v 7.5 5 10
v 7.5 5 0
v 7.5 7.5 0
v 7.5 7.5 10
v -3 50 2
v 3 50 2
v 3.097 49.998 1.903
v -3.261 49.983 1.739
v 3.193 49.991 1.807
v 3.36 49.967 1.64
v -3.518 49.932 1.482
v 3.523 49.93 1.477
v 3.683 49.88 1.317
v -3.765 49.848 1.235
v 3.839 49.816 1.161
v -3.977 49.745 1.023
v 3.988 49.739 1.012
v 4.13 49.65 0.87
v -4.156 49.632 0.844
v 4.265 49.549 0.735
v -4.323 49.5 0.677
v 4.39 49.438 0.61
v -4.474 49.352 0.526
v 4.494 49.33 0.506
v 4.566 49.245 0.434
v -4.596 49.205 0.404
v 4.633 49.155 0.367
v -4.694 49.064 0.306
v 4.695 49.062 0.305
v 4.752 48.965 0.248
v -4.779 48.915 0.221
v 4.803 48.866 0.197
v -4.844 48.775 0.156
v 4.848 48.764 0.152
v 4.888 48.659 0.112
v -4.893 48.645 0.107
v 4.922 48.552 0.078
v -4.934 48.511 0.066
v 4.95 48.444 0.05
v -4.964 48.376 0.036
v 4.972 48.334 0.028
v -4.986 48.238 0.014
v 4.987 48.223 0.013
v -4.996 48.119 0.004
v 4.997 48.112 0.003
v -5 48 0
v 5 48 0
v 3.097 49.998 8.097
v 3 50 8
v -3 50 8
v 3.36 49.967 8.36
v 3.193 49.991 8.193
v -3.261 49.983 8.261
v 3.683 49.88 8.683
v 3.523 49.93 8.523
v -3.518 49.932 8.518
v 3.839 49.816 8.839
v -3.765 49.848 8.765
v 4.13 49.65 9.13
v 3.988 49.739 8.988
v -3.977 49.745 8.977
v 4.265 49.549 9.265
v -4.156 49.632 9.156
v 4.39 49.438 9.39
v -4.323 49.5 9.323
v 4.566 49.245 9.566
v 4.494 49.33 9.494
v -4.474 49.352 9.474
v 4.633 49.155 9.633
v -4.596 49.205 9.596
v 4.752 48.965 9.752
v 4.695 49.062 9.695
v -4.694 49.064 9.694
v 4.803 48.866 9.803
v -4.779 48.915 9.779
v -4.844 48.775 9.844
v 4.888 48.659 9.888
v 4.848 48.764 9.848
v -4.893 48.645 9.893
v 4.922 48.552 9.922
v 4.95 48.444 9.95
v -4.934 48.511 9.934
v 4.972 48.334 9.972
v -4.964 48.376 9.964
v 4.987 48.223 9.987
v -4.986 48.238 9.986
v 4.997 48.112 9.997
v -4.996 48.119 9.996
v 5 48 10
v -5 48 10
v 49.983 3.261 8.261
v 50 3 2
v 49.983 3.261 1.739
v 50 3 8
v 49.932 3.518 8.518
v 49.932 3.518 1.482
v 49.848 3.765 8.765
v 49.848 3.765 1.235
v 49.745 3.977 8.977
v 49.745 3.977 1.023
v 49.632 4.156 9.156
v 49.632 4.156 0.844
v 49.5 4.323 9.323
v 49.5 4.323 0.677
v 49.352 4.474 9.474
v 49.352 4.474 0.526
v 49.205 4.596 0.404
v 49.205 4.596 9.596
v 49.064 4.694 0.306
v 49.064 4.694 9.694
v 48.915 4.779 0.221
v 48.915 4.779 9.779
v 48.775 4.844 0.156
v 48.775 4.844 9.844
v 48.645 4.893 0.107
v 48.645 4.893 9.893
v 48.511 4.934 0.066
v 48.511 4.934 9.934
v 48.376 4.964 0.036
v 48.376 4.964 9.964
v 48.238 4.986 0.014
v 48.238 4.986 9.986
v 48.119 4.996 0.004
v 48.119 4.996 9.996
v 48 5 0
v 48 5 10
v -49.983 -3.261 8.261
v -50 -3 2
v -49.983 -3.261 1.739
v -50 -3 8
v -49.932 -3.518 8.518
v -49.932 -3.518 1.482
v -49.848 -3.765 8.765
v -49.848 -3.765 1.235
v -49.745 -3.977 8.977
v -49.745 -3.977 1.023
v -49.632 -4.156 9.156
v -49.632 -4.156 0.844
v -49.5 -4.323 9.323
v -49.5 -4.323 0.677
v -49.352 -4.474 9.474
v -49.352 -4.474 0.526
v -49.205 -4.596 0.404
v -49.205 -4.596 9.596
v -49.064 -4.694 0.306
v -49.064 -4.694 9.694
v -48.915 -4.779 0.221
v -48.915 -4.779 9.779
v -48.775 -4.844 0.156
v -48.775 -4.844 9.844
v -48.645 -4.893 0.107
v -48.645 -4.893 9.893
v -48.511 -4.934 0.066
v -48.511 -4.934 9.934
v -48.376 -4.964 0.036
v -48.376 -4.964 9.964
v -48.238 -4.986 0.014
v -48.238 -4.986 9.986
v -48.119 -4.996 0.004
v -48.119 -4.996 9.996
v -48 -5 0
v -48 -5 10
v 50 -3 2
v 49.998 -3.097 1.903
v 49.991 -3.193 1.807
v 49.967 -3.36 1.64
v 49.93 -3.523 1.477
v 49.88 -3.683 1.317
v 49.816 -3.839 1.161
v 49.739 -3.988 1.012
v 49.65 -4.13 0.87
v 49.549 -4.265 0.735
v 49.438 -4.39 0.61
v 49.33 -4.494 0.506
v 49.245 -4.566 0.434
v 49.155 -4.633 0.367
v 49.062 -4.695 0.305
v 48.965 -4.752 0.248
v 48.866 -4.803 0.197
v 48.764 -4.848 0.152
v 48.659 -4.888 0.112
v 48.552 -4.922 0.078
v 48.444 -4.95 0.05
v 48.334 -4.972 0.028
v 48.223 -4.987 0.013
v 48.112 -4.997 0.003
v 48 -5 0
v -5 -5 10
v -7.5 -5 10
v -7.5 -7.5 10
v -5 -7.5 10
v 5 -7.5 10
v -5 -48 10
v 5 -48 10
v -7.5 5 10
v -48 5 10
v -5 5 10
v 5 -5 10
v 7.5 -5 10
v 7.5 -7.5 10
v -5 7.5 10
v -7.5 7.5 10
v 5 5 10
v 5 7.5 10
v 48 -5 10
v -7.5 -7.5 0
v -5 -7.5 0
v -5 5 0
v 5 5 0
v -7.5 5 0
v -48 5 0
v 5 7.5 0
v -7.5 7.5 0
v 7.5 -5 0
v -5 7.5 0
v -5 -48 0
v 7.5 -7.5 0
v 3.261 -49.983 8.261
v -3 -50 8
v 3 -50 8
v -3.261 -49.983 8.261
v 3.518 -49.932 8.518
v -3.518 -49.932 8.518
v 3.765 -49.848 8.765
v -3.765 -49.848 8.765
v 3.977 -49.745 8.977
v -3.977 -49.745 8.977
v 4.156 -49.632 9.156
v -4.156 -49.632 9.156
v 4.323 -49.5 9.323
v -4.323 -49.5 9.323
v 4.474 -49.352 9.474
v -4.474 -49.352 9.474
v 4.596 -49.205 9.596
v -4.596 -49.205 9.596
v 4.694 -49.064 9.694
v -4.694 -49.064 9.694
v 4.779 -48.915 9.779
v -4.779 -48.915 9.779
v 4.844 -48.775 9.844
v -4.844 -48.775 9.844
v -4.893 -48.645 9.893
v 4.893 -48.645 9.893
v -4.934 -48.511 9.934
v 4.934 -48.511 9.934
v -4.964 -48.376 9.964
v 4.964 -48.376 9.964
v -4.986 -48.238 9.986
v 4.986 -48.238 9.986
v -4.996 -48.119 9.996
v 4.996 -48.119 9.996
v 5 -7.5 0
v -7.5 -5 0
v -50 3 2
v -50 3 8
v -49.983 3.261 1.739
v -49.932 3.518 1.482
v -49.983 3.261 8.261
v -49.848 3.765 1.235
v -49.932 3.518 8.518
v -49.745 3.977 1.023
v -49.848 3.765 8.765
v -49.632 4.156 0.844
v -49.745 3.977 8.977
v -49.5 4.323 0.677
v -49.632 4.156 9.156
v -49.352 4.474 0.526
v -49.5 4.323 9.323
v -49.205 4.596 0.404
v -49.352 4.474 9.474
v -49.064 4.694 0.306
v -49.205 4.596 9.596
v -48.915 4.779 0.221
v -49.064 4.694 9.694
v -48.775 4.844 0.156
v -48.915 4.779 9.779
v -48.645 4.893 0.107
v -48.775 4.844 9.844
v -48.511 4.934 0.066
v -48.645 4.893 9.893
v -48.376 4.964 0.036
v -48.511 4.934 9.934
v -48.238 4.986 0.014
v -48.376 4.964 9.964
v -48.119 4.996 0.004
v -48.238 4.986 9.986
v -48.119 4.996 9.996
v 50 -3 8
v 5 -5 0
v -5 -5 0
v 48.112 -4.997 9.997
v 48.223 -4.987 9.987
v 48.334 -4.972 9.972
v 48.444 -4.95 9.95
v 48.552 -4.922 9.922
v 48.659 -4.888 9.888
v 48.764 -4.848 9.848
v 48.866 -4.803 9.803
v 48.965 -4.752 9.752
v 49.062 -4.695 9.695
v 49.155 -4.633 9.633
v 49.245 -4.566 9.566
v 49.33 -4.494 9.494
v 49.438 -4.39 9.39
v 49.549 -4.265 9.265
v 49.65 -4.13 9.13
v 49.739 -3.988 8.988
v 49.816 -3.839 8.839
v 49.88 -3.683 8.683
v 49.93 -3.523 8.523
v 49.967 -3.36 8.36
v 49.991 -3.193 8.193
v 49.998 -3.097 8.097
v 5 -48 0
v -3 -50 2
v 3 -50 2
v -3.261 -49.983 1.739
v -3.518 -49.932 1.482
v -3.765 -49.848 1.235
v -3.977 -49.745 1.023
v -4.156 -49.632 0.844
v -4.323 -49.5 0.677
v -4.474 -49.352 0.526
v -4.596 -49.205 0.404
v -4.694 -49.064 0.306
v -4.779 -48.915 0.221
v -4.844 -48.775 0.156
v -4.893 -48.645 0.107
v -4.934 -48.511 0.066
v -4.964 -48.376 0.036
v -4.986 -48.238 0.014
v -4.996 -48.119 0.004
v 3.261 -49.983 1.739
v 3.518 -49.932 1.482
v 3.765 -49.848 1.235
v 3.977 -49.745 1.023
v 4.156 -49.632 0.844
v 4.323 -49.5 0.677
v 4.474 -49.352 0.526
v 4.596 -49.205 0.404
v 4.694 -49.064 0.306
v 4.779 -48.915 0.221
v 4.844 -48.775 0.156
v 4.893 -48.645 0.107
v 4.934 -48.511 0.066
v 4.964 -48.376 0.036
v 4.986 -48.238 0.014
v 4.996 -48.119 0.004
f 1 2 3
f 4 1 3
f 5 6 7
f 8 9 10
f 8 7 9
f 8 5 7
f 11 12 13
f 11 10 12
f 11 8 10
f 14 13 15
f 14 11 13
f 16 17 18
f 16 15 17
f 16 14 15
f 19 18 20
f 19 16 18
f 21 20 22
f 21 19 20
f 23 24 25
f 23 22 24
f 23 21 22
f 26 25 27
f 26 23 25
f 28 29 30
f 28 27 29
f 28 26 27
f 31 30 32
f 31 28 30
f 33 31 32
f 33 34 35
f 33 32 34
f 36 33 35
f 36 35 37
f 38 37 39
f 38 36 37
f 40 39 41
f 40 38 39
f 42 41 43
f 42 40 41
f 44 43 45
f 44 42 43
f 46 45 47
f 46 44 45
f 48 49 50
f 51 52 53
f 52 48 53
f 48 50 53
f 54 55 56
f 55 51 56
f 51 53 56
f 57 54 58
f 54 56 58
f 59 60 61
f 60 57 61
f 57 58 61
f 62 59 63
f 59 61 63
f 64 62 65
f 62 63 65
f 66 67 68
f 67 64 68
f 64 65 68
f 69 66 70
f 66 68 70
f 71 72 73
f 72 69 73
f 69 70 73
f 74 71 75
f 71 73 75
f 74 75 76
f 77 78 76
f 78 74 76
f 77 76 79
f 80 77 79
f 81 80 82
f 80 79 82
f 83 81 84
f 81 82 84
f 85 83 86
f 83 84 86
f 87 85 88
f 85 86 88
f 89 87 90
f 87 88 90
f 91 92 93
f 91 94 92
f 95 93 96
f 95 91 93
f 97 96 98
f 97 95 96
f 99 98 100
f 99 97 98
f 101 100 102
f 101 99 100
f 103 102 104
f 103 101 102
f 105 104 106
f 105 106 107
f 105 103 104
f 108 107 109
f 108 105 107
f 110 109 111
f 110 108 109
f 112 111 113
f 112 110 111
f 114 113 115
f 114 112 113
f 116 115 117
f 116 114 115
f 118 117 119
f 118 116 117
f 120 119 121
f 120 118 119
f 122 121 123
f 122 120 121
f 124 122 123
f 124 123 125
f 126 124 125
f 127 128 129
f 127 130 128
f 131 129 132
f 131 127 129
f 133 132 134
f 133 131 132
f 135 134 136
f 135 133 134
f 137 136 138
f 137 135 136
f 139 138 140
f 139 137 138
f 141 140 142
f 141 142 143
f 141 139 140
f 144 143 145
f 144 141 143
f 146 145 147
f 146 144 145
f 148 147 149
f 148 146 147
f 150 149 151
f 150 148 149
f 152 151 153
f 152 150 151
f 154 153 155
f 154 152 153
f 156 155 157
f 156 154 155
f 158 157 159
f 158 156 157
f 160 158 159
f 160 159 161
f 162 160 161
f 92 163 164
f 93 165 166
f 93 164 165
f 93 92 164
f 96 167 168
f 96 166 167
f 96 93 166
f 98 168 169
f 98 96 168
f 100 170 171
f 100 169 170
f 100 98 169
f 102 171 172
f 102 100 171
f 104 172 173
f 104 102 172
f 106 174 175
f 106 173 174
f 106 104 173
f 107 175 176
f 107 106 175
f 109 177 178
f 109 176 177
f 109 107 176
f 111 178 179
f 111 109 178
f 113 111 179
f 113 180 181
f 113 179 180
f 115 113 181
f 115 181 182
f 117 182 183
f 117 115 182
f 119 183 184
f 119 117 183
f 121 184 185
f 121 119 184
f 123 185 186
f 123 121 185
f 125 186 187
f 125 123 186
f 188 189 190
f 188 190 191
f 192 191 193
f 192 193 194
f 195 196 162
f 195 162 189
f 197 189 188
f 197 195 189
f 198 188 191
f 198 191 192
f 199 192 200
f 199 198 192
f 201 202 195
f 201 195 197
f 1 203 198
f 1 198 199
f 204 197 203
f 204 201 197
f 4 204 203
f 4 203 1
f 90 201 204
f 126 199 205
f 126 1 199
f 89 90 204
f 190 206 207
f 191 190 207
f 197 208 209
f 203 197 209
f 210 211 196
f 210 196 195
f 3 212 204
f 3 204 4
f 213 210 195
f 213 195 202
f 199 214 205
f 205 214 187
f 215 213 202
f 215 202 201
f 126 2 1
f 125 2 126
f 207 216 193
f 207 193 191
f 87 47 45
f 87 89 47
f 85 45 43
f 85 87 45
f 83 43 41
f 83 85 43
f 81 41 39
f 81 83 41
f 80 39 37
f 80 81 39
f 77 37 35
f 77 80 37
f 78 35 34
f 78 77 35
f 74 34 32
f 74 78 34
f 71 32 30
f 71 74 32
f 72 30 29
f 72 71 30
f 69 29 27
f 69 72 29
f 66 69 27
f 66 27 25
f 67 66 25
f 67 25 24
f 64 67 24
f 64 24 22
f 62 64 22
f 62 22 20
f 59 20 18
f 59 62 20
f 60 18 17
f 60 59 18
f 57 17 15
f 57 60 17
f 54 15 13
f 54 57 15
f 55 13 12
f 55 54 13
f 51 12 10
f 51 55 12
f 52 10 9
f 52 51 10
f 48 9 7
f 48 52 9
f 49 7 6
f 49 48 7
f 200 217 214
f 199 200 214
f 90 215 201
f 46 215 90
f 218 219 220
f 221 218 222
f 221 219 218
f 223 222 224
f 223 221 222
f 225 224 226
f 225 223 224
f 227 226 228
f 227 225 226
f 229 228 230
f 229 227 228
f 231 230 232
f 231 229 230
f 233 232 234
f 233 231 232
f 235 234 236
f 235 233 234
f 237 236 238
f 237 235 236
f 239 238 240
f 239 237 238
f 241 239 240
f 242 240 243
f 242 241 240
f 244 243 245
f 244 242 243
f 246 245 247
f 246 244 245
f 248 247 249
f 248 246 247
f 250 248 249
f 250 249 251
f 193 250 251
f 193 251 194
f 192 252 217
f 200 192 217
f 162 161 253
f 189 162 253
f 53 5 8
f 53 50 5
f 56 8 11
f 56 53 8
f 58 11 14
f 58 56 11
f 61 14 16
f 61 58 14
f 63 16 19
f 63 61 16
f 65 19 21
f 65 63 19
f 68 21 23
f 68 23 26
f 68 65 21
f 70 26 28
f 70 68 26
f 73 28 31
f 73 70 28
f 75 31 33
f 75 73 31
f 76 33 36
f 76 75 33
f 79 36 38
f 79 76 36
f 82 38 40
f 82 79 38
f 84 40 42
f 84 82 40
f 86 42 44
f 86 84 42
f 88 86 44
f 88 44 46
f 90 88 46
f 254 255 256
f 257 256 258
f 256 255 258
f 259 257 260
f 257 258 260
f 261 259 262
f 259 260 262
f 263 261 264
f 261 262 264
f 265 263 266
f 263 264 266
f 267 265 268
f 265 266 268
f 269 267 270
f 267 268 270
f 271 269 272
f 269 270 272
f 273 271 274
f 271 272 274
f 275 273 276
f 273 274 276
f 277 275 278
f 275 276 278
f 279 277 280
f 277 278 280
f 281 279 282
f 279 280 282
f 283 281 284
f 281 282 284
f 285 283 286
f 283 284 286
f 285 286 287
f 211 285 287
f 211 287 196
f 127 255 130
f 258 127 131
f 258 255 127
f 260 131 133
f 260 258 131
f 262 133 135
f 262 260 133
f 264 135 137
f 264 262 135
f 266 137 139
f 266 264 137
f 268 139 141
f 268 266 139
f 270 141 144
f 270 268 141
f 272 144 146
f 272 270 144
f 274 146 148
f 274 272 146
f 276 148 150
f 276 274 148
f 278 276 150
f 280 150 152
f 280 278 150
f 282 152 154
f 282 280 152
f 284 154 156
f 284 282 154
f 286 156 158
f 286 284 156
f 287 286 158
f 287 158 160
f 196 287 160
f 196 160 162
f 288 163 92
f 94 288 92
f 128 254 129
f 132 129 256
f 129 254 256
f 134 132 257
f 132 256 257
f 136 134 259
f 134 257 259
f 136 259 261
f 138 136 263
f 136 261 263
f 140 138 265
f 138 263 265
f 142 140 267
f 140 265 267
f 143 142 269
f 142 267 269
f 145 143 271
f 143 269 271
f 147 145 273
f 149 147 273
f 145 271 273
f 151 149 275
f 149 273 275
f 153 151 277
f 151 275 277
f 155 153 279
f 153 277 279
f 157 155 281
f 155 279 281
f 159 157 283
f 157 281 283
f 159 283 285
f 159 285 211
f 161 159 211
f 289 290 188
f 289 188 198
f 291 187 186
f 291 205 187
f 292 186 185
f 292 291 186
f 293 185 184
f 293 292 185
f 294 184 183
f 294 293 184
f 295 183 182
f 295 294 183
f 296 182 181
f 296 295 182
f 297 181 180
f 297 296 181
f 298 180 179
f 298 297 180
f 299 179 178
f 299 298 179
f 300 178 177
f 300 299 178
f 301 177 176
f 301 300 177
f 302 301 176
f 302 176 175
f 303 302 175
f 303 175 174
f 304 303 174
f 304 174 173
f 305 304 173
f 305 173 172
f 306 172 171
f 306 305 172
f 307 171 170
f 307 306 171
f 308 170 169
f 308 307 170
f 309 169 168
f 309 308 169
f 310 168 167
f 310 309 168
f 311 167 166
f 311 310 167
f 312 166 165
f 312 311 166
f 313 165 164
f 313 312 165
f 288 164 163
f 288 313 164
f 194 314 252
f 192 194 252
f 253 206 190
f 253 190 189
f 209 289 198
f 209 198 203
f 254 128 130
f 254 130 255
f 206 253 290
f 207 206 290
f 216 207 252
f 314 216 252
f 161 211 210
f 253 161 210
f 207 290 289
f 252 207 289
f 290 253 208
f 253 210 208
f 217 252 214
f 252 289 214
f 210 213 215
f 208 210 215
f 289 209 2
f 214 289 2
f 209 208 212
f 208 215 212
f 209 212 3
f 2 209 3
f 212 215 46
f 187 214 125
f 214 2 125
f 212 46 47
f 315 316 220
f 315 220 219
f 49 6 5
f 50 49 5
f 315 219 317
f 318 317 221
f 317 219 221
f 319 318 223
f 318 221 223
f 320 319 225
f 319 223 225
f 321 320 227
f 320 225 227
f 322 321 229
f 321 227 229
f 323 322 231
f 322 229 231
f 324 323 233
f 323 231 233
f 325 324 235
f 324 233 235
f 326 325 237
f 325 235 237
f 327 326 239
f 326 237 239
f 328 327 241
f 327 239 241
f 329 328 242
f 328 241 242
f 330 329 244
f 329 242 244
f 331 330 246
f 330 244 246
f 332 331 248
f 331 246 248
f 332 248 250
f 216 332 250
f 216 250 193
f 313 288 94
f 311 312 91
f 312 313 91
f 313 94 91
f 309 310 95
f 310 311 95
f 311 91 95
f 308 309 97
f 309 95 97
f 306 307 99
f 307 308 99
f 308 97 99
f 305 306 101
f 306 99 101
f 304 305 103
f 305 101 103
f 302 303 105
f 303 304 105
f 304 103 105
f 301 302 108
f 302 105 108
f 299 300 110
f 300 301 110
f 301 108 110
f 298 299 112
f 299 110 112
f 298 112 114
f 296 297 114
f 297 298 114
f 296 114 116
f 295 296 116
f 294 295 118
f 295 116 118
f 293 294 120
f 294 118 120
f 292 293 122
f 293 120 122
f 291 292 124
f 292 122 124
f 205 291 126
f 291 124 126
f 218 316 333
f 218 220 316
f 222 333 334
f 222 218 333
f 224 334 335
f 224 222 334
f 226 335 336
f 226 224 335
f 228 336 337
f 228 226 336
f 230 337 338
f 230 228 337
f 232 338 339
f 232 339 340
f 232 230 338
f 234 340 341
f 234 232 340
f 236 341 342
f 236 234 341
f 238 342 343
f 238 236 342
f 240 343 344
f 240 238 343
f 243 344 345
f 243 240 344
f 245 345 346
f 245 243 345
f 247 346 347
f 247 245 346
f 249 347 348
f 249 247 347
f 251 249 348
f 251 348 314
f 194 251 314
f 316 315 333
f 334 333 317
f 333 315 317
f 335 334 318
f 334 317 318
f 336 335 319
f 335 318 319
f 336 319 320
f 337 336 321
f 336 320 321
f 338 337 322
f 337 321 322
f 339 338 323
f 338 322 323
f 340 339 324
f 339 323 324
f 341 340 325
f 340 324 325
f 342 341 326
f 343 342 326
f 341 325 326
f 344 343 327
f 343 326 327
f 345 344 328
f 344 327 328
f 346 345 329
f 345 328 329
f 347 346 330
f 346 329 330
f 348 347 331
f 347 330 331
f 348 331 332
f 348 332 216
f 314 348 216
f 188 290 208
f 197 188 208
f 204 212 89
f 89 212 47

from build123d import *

# Parameters (mm, degrees)
F1_W     = 100
F1_H     = 10
F2_DEPTH = 10
F3_R     = 2
F5_COUNT = 4
F6_W     = 15
F6_H     = 15
F6_W_2   = 10
F6_H_2   = 10
F7_DEPTH = 10
F8_DEPTH = 25.4


with BuildPart() as f2:
    # F1 (on Top) → F2 (new body)
    with BuildSketch(Plane.XY):
        Rectangle(F1_W, F1_H)
    extrude(amount=F2_DEPTH)

    # F3
    f3_edges = [f2.edges().sort_by_distance(p)[0] for p in [
        (50, -5, 5),
        (50, 5, 5),
        (50, 0, 0),
        (50, 0, 10),
        (-50, 5, 5),
        (-50, -5, 5),
        (-50, 0, 0),
        (-50, 0, 10),
    ]]
    fillet(f3_edges, radius=F3_R)

    # F5: F2 ×4 about axis
    f5_axis = Axis((0, 0, 17.9461631924), (0, 0, 1))


with BuildPart() as f2_1:
    add(f2.part)
    for i in range(1, F5_COUNT):
        add(f2.part.rotate(f5_axis, i * 360 / F5_COUNT))

    # F6 (on Top) → F7 (join)
    with BuildSketch(Plane.XY):
        Rectangle(F6_W, F6_H)
        Rectangle(F6_W_2, F6_H_2, mode=Mode.SUBTRACT)
    extrude(amount=F7_DEPTH)

    # F6 (on Top) → F8 (cut)
    with BuildSketch(Plane.XY):
        Rectangle(F6_W_2, F6_H_2)
    extrude(amount=F8_DEPTH, mode=Mode.SUBTRACT)


solid = f2_1.part
